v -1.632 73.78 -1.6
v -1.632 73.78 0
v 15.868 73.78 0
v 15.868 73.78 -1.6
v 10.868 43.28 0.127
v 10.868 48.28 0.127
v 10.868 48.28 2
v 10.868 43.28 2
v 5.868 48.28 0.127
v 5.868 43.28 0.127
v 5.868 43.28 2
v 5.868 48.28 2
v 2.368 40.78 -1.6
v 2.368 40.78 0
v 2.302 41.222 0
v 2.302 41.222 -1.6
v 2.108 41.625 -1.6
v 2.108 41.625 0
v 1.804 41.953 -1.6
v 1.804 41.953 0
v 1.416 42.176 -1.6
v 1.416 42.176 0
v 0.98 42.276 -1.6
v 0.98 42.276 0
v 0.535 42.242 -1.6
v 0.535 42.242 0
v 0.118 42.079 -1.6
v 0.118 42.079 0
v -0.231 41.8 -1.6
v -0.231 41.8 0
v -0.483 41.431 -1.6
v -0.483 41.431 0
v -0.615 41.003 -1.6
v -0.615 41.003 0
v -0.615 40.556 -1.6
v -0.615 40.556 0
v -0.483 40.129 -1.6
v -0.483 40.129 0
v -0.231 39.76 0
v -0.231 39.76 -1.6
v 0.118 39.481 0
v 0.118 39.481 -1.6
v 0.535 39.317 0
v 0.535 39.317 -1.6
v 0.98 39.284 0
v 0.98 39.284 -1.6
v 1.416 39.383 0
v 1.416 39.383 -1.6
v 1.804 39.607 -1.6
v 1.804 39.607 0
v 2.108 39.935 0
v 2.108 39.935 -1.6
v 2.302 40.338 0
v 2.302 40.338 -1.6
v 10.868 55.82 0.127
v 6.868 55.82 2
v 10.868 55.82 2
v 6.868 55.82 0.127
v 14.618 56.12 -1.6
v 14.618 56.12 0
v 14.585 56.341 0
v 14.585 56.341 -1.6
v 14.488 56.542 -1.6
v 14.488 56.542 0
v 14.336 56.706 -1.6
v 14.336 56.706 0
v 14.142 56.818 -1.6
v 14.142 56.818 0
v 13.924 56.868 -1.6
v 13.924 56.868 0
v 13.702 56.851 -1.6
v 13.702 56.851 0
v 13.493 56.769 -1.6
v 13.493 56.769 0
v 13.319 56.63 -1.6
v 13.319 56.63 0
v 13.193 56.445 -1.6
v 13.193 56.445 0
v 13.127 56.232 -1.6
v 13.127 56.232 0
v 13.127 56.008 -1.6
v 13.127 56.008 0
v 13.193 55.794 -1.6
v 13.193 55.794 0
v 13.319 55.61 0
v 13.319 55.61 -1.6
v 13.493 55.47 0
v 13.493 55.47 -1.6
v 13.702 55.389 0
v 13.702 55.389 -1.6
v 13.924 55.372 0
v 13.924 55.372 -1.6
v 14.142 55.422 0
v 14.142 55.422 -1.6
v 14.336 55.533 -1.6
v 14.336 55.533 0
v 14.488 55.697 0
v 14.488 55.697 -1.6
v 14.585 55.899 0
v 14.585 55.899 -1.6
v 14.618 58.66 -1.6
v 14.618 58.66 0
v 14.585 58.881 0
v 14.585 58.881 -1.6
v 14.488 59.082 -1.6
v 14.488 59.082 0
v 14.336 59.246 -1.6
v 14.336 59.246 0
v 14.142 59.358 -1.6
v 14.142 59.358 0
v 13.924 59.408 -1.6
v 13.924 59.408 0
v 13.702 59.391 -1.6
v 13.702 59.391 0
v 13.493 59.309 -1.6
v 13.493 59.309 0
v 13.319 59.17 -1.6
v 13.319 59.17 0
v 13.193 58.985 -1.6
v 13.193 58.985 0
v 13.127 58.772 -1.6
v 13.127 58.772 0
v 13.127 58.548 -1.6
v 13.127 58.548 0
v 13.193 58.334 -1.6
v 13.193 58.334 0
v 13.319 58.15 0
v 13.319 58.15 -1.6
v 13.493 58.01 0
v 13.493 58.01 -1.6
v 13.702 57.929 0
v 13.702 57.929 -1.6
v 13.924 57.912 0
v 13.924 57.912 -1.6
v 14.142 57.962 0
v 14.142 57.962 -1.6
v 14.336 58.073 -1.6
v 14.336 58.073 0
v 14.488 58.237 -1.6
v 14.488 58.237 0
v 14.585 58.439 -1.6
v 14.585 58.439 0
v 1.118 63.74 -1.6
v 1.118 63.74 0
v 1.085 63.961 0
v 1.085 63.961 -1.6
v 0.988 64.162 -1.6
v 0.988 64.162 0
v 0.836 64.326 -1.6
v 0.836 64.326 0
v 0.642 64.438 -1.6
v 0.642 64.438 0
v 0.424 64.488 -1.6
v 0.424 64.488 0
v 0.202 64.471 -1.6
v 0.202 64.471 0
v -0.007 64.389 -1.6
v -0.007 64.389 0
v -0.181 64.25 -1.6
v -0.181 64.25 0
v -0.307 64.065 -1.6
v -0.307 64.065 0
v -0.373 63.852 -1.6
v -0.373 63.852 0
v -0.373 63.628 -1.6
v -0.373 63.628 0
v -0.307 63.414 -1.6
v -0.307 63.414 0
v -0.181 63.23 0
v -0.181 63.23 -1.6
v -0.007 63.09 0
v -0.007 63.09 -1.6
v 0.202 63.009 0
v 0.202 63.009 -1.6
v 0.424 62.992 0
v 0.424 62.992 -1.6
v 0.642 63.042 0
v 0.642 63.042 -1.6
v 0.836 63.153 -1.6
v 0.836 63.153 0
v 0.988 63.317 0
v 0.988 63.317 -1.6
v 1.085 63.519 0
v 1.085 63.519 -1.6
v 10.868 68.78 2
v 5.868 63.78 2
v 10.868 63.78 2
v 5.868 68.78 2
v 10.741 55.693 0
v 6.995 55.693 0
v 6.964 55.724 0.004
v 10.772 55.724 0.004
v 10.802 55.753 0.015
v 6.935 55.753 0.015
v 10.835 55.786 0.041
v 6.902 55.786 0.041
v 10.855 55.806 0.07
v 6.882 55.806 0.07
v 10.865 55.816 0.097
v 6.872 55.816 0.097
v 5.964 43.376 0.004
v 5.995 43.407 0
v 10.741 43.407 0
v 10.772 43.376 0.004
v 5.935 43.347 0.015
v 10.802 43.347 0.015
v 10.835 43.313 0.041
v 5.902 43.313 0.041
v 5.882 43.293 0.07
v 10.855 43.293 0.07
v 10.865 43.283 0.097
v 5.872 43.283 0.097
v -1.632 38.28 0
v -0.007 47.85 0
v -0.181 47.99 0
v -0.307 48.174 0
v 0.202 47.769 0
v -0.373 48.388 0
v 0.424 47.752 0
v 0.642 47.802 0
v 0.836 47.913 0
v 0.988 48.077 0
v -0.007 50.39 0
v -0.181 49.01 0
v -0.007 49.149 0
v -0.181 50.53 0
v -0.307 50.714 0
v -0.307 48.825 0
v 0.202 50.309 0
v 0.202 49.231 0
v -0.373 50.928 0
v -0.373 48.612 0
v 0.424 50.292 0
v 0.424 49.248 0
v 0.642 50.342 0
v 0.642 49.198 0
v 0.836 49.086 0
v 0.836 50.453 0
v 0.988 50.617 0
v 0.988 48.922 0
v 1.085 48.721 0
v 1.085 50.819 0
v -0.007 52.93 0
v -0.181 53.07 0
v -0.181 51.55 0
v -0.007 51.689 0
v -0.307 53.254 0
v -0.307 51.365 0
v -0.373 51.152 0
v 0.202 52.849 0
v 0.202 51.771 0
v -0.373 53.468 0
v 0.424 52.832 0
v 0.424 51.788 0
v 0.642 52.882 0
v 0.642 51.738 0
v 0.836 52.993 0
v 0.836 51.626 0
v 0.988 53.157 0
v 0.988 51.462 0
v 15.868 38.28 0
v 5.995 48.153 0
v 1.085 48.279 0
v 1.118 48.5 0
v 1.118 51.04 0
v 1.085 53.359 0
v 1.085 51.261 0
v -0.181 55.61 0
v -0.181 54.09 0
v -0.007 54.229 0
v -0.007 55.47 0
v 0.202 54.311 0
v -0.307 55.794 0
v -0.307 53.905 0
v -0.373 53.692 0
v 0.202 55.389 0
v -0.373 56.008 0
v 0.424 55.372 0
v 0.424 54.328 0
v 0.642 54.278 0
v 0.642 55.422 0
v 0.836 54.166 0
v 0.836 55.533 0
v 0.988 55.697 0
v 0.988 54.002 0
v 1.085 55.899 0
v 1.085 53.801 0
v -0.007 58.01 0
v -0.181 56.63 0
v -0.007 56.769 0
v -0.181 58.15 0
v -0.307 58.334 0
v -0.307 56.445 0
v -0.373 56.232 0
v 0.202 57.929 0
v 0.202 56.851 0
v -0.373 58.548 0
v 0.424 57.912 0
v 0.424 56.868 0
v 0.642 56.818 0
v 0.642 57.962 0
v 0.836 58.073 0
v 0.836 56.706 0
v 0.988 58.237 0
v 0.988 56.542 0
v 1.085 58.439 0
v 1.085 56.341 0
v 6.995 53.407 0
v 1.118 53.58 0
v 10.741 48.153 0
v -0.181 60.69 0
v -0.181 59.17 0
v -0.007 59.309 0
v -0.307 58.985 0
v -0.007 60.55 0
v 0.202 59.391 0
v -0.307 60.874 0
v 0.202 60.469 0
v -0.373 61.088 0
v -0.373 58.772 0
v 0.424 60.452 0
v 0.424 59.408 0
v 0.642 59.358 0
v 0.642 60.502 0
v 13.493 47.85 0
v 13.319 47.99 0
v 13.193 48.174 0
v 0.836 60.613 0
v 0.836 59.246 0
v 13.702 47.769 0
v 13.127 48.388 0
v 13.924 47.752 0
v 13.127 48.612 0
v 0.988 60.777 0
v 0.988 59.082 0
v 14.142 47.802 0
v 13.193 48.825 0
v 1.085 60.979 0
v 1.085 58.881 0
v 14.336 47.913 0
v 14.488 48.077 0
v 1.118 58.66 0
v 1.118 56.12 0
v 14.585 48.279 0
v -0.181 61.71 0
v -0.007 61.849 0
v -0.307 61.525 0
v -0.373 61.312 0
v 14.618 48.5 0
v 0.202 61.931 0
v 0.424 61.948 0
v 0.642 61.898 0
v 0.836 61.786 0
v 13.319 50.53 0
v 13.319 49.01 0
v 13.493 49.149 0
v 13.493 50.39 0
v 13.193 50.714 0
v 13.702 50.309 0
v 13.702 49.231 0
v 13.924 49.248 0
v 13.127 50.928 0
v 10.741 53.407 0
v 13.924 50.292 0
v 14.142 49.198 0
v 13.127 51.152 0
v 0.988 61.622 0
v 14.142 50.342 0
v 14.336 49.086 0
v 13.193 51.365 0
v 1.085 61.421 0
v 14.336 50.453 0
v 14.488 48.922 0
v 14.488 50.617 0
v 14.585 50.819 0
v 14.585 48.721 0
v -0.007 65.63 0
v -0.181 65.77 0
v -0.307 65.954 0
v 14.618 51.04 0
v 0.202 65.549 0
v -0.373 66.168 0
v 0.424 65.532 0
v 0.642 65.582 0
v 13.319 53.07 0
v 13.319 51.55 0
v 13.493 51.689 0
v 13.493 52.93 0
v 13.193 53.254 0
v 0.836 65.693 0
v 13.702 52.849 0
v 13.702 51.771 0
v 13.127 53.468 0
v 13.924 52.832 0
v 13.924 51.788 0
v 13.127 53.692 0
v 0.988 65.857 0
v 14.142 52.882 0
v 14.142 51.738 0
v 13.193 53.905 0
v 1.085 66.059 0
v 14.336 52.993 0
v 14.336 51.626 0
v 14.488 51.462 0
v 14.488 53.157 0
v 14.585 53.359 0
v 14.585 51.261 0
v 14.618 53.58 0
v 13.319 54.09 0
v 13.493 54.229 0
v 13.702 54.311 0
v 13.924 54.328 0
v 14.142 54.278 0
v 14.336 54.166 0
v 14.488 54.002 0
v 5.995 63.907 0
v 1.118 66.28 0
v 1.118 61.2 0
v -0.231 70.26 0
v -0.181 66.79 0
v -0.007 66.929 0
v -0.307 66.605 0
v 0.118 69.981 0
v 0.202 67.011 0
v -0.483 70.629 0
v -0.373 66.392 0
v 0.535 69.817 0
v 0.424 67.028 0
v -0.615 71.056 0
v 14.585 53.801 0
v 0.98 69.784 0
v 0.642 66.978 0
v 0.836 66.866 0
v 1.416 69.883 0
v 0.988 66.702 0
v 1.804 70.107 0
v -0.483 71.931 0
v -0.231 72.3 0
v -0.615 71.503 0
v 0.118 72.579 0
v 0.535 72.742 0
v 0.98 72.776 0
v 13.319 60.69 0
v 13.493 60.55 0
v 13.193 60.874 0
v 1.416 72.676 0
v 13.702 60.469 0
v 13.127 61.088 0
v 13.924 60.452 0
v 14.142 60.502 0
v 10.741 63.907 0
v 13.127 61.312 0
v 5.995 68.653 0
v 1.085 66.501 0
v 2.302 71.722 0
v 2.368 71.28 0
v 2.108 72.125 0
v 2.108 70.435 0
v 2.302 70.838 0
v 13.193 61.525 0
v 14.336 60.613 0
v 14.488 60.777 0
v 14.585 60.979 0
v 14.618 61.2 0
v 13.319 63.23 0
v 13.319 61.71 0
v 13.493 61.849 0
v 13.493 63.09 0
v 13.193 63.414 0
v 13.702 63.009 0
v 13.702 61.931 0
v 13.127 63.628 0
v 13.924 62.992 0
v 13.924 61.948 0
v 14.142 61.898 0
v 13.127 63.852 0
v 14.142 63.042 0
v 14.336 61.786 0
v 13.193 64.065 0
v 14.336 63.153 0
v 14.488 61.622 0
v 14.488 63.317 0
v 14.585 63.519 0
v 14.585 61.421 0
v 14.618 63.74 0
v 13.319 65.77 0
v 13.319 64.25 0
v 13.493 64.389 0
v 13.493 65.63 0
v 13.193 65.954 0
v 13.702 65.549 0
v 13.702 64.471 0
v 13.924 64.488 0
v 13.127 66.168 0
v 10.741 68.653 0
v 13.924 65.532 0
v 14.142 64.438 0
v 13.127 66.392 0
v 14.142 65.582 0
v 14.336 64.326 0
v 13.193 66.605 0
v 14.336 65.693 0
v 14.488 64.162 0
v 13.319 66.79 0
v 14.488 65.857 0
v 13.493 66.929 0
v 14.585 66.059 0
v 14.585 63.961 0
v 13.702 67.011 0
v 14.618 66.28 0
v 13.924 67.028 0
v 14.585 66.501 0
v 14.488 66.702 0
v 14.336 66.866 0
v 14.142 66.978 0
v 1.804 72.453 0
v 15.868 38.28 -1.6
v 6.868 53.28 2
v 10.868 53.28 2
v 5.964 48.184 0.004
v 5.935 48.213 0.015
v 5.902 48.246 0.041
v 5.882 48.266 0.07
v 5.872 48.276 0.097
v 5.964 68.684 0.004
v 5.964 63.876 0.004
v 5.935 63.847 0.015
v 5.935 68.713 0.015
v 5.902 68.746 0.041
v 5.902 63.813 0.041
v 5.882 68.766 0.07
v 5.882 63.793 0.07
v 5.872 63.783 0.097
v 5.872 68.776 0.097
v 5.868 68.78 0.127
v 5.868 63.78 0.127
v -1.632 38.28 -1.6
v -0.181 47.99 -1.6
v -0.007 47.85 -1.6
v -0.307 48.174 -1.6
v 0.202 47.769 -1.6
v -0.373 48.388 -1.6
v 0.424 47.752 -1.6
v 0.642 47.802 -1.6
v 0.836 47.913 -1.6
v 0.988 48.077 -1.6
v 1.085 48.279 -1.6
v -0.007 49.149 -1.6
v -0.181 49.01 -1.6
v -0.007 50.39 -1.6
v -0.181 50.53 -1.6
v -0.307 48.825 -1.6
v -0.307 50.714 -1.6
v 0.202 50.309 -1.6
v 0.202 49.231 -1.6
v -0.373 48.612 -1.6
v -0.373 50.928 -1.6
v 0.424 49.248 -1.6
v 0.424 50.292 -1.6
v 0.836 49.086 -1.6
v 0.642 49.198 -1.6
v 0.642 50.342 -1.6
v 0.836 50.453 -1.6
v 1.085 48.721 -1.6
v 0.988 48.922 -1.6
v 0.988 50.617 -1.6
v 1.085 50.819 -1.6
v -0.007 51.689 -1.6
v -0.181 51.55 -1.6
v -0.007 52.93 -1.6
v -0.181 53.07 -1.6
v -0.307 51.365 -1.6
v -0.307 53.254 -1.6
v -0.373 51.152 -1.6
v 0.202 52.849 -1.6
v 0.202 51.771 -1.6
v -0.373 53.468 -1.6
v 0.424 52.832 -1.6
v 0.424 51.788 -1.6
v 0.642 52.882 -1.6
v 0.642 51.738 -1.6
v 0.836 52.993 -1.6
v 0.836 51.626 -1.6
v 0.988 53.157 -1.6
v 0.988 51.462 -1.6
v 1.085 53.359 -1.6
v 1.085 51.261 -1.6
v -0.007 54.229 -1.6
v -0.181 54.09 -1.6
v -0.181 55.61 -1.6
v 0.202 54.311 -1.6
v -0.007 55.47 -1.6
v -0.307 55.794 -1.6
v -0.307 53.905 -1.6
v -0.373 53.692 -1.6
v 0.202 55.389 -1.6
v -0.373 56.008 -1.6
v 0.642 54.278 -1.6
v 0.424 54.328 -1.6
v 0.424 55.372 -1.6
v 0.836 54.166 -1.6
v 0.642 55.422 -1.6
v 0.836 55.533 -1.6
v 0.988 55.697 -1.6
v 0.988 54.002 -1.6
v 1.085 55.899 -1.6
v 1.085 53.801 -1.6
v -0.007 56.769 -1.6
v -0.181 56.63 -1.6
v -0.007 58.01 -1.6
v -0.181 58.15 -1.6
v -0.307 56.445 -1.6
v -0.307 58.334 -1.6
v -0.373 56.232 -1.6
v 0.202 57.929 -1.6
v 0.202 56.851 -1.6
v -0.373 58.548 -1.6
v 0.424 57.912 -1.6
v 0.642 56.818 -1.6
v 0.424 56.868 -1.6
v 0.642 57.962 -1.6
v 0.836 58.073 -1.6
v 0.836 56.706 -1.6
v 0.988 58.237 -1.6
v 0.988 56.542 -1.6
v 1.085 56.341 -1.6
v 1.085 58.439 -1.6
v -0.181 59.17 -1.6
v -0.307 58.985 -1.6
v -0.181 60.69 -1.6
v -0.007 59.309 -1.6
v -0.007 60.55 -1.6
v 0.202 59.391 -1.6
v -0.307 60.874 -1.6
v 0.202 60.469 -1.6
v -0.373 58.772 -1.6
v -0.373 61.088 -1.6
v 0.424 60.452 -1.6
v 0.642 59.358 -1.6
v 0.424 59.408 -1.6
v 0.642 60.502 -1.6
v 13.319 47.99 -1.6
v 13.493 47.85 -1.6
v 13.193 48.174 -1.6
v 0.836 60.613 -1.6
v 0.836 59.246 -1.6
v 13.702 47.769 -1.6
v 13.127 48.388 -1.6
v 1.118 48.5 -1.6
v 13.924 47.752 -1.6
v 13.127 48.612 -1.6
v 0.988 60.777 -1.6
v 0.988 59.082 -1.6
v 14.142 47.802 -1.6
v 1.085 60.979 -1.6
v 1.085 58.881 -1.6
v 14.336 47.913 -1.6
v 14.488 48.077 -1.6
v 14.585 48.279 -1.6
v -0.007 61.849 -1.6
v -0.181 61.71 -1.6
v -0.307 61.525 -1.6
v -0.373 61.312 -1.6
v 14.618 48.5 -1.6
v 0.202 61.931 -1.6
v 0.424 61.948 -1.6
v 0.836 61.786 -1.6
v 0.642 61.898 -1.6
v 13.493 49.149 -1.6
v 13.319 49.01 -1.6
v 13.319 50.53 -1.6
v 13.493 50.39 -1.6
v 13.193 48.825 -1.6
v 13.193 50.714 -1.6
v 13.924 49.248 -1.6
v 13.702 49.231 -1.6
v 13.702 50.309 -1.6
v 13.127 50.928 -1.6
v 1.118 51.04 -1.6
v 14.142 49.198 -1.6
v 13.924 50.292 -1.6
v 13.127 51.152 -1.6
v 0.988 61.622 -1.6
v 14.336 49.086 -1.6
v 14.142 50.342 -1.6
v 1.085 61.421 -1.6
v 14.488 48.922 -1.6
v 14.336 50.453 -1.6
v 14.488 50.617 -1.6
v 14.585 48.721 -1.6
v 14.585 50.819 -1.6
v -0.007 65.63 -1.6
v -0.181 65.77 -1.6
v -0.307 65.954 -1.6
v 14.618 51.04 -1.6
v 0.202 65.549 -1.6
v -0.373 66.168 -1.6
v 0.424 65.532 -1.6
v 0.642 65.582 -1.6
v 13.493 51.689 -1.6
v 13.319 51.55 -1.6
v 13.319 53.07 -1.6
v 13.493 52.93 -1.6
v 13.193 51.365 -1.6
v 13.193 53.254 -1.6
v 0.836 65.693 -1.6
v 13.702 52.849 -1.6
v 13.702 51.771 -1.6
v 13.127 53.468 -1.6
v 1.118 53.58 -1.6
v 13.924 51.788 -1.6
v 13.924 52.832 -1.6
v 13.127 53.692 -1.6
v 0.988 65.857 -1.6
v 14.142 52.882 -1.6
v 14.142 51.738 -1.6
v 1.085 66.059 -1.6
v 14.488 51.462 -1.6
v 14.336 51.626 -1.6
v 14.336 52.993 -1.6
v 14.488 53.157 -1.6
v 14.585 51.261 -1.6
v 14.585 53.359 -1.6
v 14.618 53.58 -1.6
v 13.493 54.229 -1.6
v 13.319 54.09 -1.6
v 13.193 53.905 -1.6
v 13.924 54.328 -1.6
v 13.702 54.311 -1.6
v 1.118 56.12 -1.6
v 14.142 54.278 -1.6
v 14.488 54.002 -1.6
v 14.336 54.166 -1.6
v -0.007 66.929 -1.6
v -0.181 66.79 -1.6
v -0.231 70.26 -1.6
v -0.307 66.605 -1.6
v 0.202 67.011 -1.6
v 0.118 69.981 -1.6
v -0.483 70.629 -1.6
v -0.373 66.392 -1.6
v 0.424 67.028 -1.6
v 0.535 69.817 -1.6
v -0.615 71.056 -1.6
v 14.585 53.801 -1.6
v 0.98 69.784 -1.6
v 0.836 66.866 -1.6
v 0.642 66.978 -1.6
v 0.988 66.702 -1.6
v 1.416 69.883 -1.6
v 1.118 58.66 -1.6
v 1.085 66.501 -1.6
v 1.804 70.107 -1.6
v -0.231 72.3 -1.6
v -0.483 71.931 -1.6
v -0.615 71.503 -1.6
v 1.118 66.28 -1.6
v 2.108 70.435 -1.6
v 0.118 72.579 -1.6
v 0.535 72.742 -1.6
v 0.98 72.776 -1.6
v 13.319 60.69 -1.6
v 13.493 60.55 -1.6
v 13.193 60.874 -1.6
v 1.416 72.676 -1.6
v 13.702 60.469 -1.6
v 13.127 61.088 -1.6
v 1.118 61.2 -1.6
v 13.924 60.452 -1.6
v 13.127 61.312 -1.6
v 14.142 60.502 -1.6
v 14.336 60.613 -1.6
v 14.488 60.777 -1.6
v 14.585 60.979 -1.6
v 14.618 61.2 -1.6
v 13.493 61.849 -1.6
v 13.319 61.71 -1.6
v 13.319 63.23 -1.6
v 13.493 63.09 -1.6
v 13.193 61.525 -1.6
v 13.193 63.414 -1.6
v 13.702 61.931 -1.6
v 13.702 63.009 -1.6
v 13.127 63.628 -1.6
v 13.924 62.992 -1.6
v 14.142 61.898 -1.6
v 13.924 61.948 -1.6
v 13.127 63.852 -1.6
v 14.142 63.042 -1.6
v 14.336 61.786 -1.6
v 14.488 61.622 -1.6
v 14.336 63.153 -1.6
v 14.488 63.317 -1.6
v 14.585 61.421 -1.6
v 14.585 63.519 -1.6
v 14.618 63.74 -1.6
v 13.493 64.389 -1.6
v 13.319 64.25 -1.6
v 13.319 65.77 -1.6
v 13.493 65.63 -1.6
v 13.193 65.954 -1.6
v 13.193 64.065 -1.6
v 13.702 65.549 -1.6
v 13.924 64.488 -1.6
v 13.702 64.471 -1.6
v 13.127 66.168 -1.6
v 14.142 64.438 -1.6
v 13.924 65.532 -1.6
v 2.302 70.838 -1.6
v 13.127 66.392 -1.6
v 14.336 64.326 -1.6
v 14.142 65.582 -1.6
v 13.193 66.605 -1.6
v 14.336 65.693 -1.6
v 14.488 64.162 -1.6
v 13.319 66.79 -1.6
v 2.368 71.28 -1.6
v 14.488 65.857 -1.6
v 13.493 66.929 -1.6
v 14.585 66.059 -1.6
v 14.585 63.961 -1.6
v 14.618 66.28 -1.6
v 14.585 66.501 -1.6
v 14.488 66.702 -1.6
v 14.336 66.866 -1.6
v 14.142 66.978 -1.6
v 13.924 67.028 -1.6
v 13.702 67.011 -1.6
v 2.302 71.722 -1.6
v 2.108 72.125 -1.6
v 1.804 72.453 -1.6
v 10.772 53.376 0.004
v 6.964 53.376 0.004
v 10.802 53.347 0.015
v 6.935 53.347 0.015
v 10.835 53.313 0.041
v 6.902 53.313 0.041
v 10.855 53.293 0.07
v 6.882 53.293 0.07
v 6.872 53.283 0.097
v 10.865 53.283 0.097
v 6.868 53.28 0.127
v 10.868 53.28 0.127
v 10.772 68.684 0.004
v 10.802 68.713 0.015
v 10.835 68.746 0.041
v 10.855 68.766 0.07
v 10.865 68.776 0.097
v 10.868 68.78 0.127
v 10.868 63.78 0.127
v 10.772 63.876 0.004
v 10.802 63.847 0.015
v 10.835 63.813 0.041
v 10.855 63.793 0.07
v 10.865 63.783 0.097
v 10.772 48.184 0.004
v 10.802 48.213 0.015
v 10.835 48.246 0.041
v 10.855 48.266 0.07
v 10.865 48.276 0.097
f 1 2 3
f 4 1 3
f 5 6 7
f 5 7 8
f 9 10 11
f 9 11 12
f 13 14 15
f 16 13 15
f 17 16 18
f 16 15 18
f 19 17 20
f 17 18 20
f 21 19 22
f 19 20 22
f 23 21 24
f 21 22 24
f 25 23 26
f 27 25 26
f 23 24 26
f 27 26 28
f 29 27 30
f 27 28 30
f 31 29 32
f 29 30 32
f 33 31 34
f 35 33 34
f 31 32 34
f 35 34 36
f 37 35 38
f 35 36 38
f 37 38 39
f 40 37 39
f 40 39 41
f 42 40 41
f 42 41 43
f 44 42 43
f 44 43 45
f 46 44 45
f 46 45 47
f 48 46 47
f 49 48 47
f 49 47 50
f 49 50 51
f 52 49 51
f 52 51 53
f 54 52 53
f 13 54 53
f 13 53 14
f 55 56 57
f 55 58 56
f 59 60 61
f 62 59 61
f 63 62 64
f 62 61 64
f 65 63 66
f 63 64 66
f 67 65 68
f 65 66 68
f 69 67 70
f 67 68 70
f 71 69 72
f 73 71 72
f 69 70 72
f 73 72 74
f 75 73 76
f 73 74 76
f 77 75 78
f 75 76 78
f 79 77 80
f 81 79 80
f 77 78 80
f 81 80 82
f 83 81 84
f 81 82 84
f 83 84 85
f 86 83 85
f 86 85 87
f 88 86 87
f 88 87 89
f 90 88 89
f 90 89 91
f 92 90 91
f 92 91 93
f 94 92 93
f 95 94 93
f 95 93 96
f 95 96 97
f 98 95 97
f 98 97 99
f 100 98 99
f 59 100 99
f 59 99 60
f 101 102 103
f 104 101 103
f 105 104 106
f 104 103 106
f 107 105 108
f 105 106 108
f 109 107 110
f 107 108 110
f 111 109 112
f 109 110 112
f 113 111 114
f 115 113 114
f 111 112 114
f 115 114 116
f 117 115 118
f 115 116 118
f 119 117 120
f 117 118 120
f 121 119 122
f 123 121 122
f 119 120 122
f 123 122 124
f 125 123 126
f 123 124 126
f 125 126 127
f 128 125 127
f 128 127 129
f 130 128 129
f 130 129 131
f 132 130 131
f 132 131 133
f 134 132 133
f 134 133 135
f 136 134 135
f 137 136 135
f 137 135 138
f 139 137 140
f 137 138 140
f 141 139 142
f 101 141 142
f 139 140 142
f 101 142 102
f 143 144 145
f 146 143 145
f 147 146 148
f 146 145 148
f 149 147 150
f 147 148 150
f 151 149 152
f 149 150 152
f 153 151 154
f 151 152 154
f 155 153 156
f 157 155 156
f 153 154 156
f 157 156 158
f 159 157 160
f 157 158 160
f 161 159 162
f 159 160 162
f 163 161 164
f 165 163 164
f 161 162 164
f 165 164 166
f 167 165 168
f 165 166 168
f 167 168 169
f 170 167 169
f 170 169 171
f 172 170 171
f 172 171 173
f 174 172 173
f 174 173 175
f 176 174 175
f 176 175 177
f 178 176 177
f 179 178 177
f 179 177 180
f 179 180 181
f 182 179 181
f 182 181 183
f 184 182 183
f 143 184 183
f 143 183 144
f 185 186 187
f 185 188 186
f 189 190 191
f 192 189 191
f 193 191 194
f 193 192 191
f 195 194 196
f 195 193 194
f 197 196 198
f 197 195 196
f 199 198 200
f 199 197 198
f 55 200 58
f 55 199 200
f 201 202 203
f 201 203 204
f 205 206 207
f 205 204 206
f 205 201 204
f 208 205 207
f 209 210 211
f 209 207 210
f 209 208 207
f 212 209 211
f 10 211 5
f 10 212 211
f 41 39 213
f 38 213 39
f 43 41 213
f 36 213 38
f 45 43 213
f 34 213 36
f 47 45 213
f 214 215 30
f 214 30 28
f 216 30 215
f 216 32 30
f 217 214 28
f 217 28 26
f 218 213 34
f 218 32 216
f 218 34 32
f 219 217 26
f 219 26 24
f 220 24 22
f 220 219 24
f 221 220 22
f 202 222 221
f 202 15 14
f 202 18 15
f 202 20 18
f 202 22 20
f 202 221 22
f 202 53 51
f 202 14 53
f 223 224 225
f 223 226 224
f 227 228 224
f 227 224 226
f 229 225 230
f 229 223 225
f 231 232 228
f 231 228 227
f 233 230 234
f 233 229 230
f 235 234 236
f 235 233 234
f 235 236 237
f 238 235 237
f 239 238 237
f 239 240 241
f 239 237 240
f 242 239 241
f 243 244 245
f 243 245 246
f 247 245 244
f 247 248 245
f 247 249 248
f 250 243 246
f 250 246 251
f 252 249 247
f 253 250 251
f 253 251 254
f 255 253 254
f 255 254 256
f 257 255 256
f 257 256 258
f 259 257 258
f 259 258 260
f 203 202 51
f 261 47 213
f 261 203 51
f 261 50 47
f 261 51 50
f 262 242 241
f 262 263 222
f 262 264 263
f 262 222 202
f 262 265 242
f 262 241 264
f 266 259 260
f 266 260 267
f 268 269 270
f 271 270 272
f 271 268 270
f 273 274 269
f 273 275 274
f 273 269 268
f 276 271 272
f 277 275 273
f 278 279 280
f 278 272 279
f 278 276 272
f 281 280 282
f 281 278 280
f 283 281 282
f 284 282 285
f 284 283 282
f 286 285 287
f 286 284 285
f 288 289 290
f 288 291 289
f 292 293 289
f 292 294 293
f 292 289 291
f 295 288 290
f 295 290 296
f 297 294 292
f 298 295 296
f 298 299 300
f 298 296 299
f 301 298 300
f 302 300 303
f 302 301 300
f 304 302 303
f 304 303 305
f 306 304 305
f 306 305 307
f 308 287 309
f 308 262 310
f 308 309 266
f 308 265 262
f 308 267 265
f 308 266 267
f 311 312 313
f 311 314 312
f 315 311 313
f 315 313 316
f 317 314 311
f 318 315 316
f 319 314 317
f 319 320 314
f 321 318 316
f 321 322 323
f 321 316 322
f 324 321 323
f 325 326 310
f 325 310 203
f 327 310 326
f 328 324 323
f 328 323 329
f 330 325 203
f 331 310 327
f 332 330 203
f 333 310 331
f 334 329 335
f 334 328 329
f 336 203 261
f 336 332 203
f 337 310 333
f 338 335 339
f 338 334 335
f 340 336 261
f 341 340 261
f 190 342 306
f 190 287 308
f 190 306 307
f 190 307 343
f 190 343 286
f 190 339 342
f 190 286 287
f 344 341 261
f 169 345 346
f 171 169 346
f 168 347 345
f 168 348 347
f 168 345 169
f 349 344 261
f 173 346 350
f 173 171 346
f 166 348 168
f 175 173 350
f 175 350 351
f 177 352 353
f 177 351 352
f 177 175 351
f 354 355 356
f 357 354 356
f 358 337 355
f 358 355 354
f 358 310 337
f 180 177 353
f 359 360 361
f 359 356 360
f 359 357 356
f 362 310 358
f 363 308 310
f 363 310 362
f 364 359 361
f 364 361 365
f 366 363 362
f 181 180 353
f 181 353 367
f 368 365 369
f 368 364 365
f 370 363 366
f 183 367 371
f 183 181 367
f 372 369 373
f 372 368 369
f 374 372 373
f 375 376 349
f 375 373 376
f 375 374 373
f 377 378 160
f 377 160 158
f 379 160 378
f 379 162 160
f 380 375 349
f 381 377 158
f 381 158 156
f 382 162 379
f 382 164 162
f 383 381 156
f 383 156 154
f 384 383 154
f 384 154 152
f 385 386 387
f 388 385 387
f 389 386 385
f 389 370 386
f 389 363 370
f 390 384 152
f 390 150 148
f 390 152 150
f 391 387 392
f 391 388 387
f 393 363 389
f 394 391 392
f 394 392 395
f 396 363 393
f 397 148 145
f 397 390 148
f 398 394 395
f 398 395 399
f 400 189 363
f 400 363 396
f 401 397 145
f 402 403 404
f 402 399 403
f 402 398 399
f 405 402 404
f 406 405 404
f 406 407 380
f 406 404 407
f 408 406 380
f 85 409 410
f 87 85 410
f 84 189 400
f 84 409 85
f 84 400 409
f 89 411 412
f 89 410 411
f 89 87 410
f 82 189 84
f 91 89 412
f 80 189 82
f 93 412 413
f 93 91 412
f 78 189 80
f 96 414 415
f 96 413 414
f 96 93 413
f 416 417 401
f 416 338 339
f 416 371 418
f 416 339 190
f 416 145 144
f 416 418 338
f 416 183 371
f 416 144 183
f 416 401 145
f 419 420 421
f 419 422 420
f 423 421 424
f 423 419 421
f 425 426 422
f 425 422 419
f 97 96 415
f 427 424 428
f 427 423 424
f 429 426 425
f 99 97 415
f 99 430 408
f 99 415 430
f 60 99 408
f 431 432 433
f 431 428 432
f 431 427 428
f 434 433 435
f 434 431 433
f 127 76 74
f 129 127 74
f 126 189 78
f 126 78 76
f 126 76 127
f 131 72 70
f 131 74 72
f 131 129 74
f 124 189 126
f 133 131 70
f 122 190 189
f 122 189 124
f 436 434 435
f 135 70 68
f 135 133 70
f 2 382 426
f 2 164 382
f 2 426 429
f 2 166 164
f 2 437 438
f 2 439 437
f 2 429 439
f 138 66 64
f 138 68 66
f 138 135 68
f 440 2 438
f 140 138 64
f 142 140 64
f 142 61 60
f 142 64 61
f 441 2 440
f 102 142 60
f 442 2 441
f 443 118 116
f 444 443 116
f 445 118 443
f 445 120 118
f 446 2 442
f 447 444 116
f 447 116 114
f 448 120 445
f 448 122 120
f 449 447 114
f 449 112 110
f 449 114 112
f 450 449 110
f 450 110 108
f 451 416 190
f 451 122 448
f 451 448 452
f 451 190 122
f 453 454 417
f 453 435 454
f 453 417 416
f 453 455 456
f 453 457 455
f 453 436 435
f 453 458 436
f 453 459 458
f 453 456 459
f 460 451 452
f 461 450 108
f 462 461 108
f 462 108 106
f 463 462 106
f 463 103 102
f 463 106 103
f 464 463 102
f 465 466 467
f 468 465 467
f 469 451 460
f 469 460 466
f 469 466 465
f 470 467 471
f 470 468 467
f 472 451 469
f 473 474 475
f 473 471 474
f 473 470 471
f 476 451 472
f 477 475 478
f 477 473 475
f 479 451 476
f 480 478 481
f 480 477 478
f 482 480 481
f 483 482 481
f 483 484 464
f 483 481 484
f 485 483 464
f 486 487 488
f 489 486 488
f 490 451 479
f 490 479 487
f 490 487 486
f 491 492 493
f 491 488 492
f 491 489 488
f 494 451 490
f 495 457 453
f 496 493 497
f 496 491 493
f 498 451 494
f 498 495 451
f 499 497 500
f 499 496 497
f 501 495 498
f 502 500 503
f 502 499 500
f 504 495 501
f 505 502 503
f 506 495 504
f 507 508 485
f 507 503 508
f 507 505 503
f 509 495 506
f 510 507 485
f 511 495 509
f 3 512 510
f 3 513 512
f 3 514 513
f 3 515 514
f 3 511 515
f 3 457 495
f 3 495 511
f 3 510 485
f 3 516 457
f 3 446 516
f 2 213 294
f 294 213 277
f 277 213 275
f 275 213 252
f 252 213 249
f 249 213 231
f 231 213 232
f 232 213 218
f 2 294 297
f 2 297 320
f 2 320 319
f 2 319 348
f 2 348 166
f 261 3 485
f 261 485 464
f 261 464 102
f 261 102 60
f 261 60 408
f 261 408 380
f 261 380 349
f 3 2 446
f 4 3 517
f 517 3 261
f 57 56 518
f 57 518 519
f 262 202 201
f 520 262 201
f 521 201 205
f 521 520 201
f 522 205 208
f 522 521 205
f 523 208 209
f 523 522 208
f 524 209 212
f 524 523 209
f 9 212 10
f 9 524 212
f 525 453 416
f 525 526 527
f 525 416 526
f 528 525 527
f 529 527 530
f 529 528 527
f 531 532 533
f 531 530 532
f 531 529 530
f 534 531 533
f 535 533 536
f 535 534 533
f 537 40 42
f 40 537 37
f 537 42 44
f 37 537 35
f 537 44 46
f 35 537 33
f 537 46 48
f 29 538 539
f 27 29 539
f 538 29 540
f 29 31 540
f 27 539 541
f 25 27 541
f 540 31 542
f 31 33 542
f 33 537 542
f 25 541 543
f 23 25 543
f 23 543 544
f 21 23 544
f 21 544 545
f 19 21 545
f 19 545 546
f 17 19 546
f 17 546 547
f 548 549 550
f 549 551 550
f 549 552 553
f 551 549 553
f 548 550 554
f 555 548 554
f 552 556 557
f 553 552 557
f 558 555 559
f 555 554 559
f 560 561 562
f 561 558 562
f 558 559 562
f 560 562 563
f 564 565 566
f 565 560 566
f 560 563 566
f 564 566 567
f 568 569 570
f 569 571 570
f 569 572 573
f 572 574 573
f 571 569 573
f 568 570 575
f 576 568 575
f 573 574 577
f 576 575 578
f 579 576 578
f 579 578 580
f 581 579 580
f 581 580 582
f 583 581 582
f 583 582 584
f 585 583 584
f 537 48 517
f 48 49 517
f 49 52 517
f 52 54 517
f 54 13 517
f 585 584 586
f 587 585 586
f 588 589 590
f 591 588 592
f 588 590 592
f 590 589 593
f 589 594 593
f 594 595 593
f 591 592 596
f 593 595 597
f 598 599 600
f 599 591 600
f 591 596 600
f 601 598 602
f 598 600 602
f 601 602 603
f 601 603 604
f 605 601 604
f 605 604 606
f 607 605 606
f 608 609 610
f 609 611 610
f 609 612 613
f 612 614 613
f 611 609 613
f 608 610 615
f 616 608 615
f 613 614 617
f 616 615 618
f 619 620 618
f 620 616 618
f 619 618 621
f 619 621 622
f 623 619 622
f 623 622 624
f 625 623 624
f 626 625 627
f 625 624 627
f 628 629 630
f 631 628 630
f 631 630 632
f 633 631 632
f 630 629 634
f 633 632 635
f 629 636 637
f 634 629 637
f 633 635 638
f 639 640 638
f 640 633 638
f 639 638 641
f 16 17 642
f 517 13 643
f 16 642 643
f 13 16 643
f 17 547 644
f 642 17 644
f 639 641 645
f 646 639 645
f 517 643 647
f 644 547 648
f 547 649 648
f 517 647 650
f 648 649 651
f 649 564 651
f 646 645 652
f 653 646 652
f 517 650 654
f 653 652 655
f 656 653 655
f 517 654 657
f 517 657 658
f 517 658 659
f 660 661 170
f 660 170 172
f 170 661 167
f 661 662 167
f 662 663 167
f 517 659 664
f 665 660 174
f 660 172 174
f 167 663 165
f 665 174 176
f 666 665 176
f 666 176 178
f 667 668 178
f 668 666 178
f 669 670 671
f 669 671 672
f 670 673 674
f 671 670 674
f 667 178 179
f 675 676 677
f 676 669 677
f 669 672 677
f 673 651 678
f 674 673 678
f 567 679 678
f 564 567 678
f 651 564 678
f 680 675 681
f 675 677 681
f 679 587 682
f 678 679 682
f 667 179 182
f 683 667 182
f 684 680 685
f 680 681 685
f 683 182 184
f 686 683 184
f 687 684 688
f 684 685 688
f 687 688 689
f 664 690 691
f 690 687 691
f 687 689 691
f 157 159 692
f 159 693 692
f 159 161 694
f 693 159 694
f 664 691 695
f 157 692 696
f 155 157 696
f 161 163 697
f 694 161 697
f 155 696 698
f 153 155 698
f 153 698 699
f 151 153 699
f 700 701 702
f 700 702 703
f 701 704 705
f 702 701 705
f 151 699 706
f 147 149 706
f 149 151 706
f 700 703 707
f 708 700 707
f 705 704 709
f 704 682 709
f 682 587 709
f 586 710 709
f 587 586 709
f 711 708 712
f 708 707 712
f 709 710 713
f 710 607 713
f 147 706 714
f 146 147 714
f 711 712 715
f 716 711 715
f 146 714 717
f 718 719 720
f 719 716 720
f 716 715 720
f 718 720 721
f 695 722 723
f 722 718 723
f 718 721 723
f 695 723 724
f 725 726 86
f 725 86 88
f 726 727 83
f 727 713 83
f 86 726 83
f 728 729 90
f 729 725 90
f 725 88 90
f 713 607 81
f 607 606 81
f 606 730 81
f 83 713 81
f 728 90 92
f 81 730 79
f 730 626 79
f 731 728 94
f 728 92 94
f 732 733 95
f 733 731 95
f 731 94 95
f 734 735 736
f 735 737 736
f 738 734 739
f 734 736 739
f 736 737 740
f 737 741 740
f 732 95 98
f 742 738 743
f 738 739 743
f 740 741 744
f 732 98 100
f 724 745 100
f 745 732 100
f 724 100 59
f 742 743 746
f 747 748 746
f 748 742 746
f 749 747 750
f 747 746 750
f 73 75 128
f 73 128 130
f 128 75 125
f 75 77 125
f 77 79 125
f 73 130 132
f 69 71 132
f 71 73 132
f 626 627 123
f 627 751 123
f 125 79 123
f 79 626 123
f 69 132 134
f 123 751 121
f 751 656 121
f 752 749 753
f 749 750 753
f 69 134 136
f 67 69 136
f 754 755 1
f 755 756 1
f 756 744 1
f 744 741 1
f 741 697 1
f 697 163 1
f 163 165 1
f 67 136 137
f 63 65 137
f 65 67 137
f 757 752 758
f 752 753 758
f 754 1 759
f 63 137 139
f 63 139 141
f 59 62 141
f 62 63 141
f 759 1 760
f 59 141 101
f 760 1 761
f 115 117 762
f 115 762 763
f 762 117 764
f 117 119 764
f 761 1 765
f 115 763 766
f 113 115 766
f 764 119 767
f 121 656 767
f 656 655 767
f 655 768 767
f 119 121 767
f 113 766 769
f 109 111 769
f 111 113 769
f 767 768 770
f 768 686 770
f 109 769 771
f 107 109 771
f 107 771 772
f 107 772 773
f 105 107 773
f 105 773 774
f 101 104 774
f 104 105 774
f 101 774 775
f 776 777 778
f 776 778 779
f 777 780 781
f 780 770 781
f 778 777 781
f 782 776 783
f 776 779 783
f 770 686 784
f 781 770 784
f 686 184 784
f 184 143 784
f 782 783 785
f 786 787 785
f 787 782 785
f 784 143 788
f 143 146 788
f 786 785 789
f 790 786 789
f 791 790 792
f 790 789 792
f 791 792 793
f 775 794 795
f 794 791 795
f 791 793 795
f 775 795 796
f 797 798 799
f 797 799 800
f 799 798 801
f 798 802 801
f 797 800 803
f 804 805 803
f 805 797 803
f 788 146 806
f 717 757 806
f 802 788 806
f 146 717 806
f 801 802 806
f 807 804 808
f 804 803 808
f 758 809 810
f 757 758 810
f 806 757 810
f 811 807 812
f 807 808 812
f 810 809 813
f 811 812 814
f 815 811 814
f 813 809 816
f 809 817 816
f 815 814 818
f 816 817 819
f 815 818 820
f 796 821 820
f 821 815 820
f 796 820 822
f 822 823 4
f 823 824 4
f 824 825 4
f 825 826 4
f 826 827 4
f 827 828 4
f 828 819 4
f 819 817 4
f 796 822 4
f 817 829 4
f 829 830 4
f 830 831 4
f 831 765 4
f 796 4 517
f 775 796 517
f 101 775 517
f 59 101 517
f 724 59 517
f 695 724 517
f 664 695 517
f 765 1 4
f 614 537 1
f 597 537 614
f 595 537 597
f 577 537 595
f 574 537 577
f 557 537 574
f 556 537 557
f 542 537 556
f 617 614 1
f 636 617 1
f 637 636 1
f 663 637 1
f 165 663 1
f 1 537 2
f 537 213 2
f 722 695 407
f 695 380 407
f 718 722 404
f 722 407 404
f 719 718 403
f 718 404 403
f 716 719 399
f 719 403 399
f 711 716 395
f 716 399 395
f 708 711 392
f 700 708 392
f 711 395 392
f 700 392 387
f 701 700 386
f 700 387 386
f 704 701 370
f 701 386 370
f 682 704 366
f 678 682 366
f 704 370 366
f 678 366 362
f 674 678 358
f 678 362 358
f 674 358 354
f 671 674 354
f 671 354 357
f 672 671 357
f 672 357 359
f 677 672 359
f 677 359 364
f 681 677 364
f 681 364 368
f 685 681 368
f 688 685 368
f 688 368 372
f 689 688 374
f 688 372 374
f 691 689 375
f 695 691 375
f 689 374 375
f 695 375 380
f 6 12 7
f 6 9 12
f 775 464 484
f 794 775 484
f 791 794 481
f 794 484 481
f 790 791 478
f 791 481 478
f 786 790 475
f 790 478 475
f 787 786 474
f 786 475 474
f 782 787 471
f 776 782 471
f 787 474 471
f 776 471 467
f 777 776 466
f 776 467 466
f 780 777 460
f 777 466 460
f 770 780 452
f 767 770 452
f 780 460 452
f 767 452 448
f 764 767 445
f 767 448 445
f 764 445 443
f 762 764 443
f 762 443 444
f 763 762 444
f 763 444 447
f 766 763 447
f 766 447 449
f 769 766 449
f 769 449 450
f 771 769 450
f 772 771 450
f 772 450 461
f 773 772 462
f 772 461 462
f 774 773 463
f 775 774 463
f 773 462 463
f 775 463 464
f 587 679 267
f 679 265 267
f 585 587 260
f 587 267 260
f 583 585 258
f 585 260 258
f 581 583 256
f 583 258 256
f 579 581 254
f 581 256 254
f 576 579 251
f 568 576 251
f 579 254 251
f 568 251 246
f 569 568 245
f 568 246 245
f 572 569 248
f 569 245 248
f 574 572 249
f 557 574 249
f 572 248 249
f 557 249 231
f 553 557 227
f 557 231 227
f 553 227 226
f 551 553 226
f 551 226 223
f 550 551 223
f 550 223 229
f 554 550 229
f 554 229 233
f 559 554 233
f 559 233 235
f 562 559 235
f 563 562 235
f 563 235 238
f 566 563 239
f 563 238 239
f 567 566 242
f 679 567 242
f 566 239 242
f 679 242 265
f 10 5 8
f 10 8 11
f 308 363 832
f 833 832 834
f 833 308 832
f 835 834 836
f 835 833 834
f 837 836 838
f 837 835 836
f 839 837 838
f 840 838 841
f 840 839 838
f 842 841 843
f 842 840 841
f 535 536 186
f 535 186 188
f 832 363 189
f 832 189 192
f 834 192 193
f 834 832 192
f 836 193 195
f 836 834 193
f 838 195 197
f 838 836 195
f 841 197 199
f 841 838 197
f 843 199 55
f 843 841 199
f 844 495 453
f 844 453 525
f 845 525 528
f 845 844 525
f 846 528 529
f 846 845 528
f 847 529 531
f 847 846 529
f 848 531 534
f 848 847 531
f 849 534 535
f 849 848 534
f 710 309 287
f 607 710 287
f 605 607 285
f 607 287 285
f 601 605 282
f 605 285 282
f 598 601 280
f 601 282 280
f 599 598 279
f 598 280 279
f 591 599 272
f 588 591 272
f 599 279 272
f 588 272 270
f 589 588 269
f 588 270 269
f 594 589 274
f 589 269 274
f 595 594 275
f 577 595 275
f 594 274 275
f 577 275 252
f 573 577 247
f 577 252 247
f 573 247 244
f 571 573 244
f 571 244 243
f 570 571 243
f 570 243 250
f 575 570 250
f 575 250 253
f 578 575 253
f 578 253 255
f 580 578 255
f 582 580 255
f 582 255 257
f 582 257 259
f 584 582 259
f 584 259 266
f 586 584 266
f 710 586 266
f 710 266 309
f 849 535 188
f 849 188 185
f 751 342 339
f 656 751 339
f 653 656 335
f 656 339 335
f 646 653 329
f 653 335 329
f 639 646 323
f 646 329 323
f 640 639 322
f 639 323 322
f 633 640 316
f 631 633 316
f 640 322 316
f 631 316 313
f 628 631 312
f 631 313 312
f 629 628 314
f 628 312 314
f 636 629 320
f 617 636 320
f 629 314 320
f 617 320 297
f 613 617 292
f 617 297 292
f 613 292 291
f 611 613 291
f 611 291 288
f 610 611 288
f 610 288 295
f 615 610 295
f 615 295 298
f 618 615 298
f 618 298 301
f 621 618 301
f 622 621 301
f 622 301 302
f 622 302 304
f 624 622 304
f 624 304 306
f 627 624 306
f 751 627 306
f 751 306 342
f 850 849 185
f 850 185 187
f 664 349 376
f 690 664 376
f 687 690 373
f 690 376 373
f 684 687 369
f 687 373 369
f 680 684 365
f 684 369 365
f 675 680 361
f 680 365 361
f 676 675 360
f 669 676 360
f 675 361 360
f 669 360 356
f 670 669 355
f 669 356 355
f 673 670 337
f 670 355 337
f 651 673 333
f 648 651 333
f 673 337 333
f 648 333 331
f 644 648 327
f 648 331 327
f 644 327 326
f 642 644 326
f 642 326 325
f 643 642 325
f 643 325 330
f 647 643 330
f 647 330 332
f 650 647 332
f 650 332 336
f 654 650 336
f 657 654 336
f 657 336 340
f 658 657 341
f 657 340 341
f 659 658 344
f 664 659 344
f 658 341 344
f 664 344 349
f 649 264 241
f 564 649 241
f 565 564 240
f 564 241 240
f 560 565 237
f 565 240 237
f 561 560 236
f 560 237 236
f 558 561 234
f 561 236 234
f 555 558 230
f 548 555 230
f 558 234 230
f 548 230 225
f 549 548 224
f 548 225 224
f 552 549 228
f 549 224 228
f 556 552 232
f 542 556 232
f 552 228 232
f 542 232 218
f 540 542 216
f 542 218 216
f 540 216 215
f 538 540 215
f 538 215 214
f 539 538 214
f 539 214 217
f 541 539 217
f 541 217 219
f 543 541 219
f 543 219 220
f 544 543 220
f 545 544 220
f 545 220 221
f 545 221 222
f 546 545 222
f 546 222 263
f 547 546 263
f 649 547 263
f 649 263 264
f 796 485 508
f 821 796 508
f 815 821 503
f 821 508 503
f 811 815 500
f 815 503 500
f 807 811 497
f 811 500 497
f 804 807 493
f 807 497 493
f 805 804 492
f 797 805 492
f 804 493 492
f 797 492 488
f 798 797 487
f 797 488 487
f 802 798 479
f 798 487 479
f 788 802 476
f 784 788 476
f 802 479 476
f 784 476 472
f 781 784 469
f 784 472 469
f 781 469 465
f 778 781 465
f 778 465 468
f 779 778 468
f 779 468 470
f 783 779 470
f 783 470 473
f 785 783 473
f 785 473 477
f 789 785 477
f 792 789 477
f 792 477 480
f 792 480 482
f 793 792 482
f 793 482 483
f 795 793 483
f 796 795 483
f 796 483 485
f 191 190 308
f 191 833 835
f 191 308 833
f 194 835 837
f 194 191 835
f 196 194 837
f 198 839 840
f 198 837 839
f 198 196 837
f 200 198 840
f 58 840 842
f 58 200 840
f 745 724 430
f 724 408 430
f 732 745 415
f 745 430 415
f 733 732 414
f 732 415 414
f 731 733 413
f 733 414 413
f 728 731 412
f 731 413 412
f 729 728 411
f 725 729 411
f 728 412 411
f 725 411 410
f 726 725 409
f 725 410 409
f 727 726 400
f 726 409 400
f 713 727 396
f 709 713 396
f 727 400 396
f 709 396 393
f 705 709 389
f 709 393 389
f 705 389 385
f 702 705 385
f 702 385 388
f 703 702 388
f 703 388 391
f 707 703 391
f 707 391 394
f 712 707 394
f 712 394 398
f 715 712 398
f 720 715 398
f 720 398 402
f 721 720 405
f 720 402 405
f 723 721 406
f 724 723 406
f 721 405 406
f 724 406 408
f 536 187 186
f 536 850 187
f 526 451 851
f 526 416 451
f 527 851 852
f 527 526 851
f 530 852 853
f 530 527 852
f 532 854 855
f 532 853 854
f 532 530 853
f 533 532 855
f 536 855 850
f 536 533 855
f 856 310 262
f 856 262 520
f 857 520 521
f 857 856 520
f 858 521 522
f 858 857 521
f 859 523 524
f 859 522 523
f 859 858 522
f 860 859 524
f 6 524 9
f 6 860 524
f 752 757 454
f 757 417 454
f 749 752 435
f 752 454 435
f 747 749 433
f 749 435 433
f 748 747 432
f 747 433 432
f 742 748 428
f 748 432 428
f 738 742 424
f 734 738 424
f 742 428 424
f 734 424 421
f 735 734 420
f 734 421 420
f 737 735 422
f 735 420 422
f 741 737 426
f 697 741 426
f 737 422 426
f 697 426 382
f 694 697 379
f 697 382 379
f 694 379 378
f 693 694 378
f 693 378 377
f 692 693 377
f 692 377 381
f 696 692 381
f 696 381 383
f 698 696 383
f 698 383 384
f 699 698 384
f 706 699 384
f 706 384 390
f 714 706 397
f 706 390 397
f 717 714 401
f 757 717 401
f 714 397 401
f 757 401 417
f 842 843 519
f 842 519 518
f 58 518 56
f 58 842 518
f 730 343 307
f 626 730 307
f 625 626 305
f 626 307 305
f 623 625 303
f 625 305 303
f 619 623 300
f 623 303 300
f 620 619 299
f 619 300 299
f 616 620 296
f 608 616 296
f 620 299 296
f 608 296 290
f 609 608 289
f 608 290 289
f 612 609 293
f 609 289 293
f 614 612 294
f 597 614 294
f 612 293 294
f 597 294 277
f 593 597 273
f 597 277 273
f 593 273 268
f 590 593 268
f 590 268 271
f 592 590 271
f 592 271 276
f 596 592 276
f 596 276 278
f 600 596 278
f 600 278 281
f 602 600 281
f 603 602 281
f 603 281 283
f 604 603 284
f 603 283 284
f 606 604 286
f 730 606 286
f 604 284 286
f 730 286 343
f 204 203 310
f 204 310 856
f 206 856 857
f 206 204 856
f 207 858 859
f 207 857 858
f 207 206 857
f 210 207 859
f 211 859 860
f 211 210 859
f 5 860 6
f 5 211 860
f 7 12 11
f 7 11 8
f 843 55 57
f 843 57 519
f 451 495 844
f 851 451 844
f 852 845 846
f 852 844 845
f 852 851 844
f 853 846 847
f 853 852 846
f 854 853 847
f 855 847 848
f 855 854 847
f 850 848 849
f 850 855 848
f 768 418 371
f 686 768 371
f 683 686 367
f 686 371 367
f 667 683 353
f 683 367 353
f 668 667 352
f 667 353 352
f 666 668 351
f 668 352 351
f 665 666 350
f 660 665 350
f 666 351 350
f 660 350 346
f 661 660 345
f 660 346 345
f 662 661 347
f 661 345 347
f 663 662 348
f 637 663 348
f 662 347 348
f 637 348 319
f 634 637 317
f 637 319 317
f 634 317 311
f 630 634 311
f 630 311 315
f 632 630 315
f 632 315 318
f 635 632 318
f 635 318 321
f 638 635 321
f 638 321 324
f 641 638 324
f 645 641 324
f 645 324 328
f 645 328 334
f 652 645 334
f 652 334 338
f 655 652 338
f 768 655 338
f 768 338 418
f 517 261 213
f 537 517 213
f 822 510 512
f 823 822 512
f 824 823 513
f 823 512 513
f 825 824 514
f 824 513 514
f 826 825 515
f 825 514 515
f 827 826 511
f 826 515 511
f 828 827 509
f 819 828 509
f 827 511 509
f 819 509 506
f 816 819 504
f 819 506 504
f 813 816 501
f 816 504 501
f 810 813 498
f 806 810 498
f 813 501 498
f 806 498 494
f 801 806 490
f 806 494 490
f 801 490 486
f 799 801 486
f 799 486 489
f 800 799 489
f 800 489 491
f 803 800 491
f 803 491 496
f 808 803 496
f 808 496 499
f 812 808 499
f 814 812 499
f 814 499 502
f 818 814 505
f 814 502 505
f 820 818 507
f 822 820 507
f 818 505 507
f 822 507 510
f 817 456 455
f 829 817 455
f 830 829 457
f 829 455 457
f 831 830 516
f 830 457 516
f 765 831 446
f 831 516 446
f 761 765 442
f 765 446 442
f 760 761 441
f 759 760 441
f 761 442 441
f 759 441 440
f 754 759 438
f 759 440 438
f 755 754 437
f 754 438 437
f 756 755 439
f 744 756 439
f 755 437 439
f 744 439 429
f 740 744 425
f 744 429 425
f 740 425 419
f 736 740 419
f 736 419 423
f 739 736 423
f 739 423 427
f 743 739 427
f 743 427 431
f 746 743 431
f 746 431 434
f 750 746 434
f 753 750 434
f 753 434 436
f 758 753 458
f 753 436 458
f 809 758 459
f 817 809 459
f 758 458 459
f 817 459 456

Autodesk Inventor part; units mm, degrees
ref_plane "YZ Plane" through (0, 0, 0) normal (1, 0, 0) x (0, 1, 0)
ref_plane "XZ Plane" through (0, 0, 0) normal (0, 1, 0) x (-1, 0, 0)
ref_plane "XY Plane" through (0, 0, 0) normal (0, 0, 1) x (1, 0, 0)
sketch "Sketch1" plane through (0, 0, 0) normal (0, 0, 1) x (1, 0, 0)
  line L0 (35.093, -7.2202) -> (-19.907, -7.2202)
  line L1 (-19.907, -7.2202) -> (-19.907, 74.7798)
  line L2 (-19.907, 74.7798) -> (35.093, 74.7798)
  line L3 (35.093, 74.7798) -> (35.093, -7.2202)
  line L4 (-1.6316, 73.7798) -> (15.8684, 73.7798)
  line L5 (15.8684, 73.7798) -> (15.8684, 38.2798)
  line L6 (15.8684, 38.2798) -> (-1.6316, 38.2798)
  line L7 (-1.6316, 38.2798) -> (-1.6316, 73.7798)
  circle A0 centre (7.5885, 28.2798) radius 5.75
  line L8 (12.233, 6.0025) -> (3.233, 6.0025)
  line L9 (3.233, 6.0025) -> (3.233, -3.9975)
  line L10 (3.233, -3.9975) -> (12.233, -3.9975)
  line L11 (12.233, -3.9975) -> (12.233, 6.0025)
  circle A1 centre (7.5885, 28.2798) radius 1.25
  line L12 (3.233, 6.0025) -> (-2.767, 6.0025)
  line L13 (-2.767, 6.0025) -> (-2.767, -3.9975)
  line L14 (-2.767, -3.9975) -> (3.233, -3.9975)
  line L15 (3.233, -3.9975) -> (3.233, 6.0025)
  line L16 (12.233, 5.3167) -> (16.7288, 5.3167)
  line L17 (16.7288, 5.3167) -> (16.7288, 2.7767)
  line L18 (16.7288, 2.7767) -> (12.233, 2.7767)
  line L19 (12.233, 2.7767) -> (12.233, 5.3167)
  line L20 (12.233, -1.5375) -> (12.233, 1.0025)
  line L21 (12.233, -3.4895) -> (12.233, -0.9495)
  line L22 (12.233, 2.2687) -> (16.7288, 2.2687)
  line L23 (16.7288, 2.2687) -> (16.7288, -0.2713)
  line L24 (16.7288, -0.2713) -> (12.233, -0.2713)
  line L25 (12.233, -0.2713) -> (12.233, 2.2687)
  line L26 (12.233, -0.7793) -> (16.7288, -0.7793)
  line L27 (16.7288, -0.7793) -> (16.7288, -3.3193)
  line L28 (16.7288, -3.3193) -> (12.233, -3.3193)
  line L29 (12.233, -3.3193) -> (12.233, -0.7793)
  circle A2 centre (0.233, 0.9987) radius 1.5
  circle A3 centre (0.3684, 66.2798) radius 0.75
  circle A4 centre (0.3684, 63.7398) radius 0.75
  circle A5 centre (0.3684, 61.1998) radius 0.75
  circle A6 centre (0.3684, 58.6598) radius 0.75
  circle A7 centre (0.3684, 56.1198) radius 0.75
  circle A8 centre (0.3684, 53.5798) radius 0.75
  circle A9 centre (0.3684, 51.0398) radius 0.75
  circle A10 centre (0.3684, 48.4998) radius 0.75
  circle A11 centre (13.8684, 63.7398) radius 0.75
  circle A12 centre (13.8684, 58.6598) radius 0.75
  circle A13 centre (13.8684, 56.1198) radius 0.75
  circle A14 centre (13.8684, 53.5798) radius 0.75
  circle A15 centre (13.8684, 48.4998) radius 0.75
  circle A16 centre (13.8684, 66.2798) radius 0.75
  circle A17 centre (13.8684, 51.0398) radius 0.75
  circle A18 centre (13.8684, 61.1998) radius 0.75
  line L30 (-17.907, 69.7798) -> (-16.407, 69.7798)
  line L31 (-16.407, 69.7798) -> (-16.407, -2.2202)
  line L32 (-16.407, -2.2202) -> (-17.907, -2.2202)
  line L33 (-17.907, -2.2202) -> (-17.907, 69.7798)
  line L34 (-15.367, -2.2202) -> (-13.867, -2.2202)
  line L35 (-13.867, -2.2202) -> (-13.867, 69.7798)
  line L36 (-13.867, 69.7798) -> (-15.367, 69.7798)
  line L37 (-15.367, 69.7798) -> (-15.367, -2.2202)
  line L38 (31.593, 69.7798) -> (33.093, 69.7798)
  line L39 (33.093, 69.7798) -> (33.093, -2.2202)
  line L40 (33.093, -2.2202) -> (31.593, -2.2202)
  line L41 (31.593, -2.2202) -> (31.593, 69.7798)
  line L42 (30.553, -2.2202) -> (29.053, -2.2202)
  line L43 (29.053, -2.2202) -> (29.053, 69.7798)
  line L44 (29.053, 69.7798) -> (30.553, 69.7798)
  line L45 (30.553, 69.7798) -> (30.553, -2.2202)
  line L46 (5.8684, 68.7798) -> (10.8684, 68.7798)
  line L47 (10.8684, 68.7798) -> (10.8684, 63.7798)
  line L48 (10.8684, 63.7798) -> (5.8684, 63.7798)
  line L49 (5.8684, 63.7798) -> (5.8684, 68.7798)
  line L50 (6.8684, 55.8198) -> (10.8684, 55.8198)
  line L51 (10.8684, 55.8198) -> (10.8684, 53.2798)
  line L52 (10.8684, 53.2798) -> (6.8684, 53.2798)
  line L53 (6.8684, 53.2798) -> (6.8684, 55.8198)
  line L54 (5.8684, 48.2798) -> (10.8684, 48.2798)
  line L55 (10.8684, 48.2798) -> (10.8684, 43.2798)
  line L56 (10.8684, 43.2798) -> (5.8684, 43.2798)
  line L57 (5.8684, 43.2798) -> (5.8684, 48.2798)
  circle A19 centre (0.8684, 71.2798) radius 1.5
  circle A20 centre (0.8684, 40.7798) radius 1.5
  point P0 (0, 0)
  point P1 (0, 0)
  dimension "d0" = 82
  dimension "d1" = 55
  dimension "d2" = 17.5
  dimension "d3" = 35.5
  dimension "d4" = 11.5
  dimension "d5" = 2.5
  dimension "d6" = 1
  dimension "d7" = 10
  dimension "d8" = 27.4955
  dimension "d9" = 9
  dimension "d10" = 10
  dimension "d11" = 6
  dimension "d12" = 22.86
  dimension "d13" = 19.2246
  dimension "d14" = 2.54
  dimension "d15" = 0.6858
  dimension "d16" = 10
  dimension "d17" = 2.54
  dimension "d18" = 0.508
  dimension "d19" = 4.4958
  dimension "d20" = 4.4958
  dimension "d21" = 2.54
  dimension "d22" = 4.4958
  dimension "d23" = 0.508
  dimension "d24" = 3
  dimension "d25" = 1.5
  dimension "d26" = 7.5
  dimension "d27" = 2
  dimension "d28" = 1.5
  dimension "d29" = 1.5
  dimension "d30" = 1.5
  dimension "d31" = 1.5
  dimension "d32" = 1.5
  dimension "d33" = 1.5
  dimension "d34" = 1.5
  dimension "d35" = 2.54
  dimension "d36" = 2.54
  dimension "d37" = 2.54
  dimension "d38" = 2.54
  dimension "d39" = 2.54
  dimension "d40" = 2.54
  dimension "d41" = 2.54
  dimension "d42" = 1.5
  dimension "d43" = 1.5
  dimension "d44" = 1.5
  dimension "d45" = 1.5
  dimension "d46" = 1.5
  dimension "d47" = 1.5
  dimension "d48" = 1.5
  dimension "d49" = 1.5
  dimension "d50" = 2.54
  dimension "d51" = 2.54
  dimension "d52" = 2.54
  dimension "d53" = 2.54
  dimension "d54" = 2.54
  dimension "d55" = 2.54
  dimension "d56" = 2.54
  dimension "d57" = 2
  dimension "d58" = 7.5
  dimension "d59" = 2
  dimension "d60" = 2
  dimension "d61" = 2
  dimension "d62" = 2
  dimension "d63" = 2
extrude "Extrusion1" add sketch "Sketch1" along normal blind 2 contours L46 L47 L48 L49 | L50 L51 L52 L53 | L54 L55 L56 L57
fillet "Fillet1" radius 0.127 12 edges at (8.3684, 68.7798, 0) (5.8684, 66.2798, 0) (8.3684, 63.7798, 0) (10.8684, 66.2798, 0) (6.8684, 54.5498, 0) (8.8684, 55.8198, 0) (10.8684, 54.5498, 0) (8.8684, 53.2798, 0) (8.3684, 48.2798, 0) (5.8684, 45.7798, 0) (8.3684, 43.2798, 0) (10.8684, 45.7798, 0)
extrude "Extrusion2" add sketch "Sketch1" against normal blind 1.6 contours L4 L5 L6 L7 | L46 L47 L48 L49 | L50 L51 L52 L53 | L54 L55 L56 L57
properties part number "IMU"
